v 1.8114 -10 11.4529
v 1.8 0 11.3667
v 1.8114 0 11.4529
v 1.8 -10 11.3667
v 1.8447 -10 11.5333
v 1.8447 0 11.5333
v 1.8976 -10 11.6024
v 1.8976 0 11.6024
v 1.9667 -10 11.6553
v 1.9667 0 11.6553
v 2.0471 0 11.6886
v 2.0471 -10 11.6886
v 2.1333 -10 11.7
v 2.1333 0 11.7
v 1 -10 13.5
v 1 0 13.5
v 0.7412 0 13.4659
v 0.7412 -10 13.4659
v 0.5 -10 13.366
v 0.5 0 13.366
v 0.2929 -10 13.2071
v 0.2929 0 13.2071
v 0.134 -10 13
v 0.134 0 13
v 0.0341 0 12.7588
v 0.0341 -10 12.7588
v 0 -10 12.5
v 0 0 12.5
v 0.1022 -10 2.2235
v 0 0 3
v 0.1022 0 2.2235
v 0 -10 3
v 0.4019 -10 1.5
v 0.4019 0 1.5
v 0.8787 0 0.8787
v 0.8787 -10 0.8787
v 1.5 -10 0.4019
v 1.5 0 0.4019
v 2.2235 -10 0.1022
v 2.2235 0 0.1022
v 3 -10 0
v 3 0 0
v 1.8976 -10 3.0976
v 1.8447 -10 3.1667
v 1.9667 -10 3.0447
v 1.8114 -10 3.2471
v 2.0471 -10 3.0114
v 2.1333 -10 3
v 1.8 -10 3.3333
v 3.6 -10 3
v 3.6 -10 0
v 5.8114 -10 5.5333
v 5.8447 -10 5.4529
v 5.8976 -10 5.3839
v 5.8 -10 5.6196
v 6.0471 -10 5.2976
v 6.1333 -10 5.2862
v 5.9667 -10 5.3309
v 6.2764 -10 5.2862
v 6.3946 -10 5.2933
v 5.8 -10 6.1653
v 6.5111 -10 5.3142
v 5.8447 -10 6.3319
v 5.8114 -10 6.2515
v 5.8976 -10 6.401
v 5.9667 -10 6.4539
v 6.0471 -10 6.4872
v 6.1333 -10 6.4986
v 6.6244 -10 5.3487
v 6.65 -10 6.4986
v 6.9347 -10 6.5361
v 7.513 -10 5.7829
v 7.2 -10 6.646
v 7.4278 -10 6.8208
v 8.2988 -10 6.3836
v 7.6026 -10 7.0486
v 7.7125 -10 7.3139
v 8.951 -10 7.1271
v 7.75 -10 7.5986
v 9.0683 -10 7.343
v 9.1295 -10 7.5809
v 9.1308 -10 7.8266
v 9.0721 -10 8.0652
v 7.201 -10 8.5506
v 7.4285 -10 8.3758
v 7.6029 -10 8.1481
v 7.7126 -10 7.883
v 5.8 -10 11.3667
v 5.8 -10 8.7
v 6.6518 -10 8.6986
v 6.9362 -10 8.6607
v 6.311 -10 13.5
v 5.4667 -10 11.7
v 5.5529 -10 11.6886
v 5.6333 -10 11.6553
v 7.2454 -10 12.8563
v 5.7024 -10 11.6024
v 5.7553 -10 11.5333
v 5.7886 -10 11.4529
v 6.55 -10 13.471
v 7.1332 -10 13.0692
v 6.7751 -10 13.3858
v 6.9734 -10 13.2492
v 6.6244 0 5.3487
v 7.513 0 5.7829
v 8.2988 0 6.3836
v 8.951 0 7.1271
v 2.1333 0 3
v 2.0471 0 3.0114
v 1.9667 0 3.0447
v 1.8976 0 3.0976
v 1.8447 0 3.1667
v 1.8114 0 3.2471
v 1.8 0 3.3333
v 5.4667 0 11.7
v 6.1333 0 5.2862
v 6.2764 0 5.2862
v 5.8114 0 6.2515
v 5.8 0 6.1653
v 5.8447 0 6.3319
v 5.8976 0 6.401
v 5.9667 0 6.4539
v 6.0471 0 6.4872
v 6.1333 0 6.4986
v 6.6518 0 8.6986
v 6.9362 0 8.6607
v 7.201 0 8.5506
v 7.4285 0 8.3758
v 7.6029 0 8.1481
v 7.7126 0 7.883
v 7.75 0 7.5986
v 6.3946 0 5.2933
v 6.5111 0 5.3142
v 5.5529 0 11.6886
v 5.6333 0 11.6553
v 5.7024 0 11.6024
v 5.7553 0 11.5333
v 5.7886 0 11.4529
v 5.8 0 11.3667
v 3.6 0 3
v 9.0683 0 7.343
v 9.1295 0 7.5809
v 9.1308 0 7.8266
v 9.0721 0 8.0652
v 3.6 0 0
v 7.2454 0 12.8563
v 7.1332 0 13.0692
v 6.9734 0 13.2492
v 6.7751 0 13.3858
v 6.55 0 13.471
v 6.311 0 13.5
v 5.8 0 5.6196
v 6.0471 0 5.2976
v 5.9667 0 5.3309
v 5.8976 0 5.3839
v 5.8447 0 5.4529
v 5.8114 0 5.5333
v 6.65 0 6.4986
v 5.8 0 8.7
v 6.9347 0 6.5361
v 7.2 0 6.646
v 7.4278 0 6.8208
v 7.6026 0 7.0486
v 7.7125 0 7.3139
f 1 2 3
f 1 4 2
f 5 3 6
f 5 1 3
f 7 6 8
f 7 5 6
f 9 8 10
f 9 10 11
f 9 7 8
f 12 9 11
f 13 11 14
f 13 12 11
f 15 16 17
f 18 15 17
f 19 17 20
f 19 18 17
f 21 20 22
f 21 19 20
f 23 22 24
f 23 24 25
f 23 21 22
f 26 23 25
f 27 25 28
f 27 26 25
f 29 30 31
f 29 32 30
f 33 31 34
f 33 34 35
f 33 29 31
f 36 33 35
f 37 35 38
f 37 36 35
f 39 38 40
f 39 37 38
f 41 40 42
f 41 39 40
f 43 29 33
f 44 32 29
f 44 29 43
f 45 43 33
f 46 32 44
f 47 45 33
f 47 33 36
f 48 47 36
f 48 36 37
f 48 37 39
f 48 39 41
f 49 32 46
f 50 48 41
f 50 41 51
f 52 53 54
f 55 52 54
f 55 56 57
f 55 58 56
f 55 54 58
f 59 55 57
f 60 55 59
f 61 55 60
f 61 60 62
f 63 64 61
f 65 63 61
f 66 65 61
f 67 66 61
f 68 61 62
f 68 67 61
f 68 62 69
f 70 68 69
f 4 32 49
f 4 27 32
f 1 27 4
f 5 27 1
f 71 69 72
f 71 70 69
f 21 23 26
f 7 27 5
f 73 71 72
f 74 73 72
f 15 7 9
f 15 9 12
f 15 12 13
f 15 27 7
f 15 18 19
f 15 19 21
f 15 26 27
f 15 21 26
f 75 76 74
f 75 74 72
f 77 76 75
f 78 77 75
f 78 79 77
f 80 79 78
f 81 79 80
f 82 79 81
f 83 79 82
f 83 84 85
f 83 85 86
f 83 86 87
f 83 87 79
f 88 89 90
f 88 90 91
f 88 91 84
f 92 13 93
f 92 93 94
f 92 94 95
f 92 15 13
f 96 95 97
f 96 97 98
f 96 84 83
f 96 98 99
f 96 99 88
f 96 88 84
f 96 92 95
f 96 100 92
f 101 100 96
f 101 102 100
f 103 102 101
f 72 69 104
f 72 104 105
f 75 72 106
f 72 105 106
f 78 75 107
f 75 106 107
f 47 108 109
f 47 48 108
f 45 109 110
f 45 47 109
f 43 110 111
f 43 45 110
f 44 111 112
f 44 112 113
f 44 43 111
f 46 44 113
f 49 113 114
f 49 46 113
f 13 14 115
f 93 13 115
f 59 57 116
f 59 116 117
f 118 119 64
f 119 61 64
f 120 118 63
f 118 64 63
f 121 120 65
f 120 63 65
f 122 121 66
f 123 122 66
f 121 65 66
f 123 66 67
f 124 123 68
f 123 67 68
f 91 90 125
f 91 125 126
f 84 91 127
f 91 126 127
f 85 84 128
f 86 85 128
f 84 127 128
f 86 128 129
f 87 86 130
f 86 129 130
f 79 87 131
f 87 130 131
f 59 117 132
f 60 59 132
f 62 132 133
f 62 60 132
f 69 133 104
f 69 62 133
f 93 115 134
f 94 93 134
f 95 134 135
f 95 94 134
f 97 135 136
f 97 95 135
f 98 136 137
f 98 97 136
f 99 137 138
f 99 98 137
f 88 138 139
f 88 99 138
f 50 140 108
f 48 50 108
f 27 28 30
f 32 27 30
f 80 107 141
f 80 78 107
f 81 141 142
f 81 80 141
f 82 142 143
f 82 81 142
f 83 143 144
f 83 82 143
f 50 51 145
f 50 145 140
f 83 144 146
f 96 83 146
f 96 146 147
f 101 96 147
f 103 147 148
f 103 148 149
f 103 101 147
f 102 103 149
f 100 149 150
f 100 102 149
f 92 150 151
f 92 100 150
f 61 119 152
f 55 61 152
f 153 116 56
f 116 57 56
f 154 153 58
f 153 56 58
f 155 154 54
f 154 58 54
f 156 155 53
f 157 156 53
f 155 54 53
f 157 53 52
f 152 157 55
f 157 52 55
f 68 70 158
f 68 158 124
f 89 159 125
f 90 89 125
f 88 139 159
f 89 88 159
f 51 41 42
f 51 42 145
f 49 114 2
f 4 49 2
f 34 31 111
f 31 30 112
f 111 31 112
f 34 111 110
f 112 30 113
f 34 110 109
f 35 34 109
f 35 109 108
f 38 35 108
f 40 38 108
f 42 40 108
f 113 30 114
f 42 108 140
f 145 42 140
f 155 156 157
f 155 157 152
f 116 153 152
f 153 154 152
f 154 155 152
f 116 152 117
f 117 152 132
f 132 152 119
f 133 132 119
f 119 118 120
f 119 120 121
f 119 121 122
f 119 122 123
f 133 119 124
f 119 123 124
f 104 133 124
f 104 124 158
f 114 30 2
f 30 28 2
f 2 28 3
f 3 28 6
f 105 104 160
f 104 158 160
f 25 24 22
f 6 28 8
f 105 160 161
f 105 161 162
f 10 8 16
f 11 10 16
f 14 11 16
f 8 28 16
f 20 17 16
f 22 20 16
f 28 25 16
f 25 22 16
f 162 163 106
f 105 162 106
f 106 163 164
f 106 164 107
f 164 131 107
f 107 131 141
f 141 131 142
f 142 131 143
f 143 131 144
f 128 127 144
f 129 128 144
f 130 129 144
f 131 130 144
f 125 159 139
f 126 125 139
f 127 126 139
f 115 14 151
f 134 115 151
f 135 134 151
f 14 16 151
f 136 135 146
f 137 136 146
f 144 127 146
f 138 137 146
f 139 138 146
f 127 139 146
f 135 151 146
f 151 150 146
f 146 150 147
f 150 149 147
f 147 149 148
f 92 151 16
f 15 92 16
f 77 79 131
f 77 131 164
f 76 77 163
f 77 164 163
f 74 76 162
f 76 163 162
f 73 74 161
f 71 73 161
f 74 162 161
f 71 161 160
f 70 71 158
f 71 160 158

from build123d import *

# Parameters (mm, degrees)
F1_DEPTH = 10
F2_R     = 1
F3_R     = 3
F4_R     = 0.33333


with BuildPart() as f1:
    # F0 (on Front) → F1 (new body)
    with BuildSketch(Plane.XZ):
        with BuildLine():
            Line((0, 0), (3.6, 0))
            Line((3.6, 0), (3.6, 3))
            Line((3.6, 3), (1.8, 3))
            Line((1.8, 3), (1.8, 11.7))
            Line((1.8, 11.7), (5.8, 11.7))
            Line((5.8, 11.7), (5.8, 8.7))
            Line((5.8, 8.7), (6.6518087818, 8.6985993288))
            ThreePointArc((6.6518087818, 8.6985993288), (7.4284566976, 8.3757785113), (7.75, 7.598600816))
            Line((7.75, 7.598600816), (9.25, 7.598600816))
            Line((9.25, 7.598600816), (7, 13.5))
            Line((7, 13.5), (0, 13.5))
            Line((0, 13.5), (0, 0))
        make_face()
        with BuildLine():
            ThreePointArc((6.4457045279, 5.2862485499), (8.0654097754, 6.1785827272), (9.25, 7.598600816))
            Line((9.25, 7.598600816), (7.75, 7.598600816))
            ThreePointArc((7.75, 7.598600816), (7.4278174593, 6.8207833567), (6.65, 6.498600816))
            Line((6.65, 6.498600816), (5.8, 6.498600816))
            Line((5.8, 6.498600816), (5.8, 5.2862485499))
            Line((5.8, 5.2862485499), (6.4457045279, 5.2862485499))
        make_face()
    extrude(amount=F1_DEPTH)

    # F2
    f2_edges = [f1.edges().sort_by_distance(p)[0] for p in [
        (0, -5, 13.5),
        (7, -5, 13.5),
        (6.445705, -5, 5.286249),
        (9.25, -5, 7.598601),
    ]]
    fillet(f2_edges, radius=F2_R)

    # F3
    f3_edges = [f1.edges().sort_by_distance(p)[0] for p in [
        (0, -5, 0),
    ]]
    fillet(f3_edges, radius=F3_R)

    # F4
    f4_edges = [f1.edges().sort_by_distance(p)[0] for p in [
        (5.8, -5, 11.7),
        (5.8, -5, 5.286249),
        (5.8, -5, 6.498601),
        (1.8, -5, 3),
        (1.8, -5, 11.7),
    ]]
    fillet(f4_edges, radius=F4_R)


solid = f1.part
